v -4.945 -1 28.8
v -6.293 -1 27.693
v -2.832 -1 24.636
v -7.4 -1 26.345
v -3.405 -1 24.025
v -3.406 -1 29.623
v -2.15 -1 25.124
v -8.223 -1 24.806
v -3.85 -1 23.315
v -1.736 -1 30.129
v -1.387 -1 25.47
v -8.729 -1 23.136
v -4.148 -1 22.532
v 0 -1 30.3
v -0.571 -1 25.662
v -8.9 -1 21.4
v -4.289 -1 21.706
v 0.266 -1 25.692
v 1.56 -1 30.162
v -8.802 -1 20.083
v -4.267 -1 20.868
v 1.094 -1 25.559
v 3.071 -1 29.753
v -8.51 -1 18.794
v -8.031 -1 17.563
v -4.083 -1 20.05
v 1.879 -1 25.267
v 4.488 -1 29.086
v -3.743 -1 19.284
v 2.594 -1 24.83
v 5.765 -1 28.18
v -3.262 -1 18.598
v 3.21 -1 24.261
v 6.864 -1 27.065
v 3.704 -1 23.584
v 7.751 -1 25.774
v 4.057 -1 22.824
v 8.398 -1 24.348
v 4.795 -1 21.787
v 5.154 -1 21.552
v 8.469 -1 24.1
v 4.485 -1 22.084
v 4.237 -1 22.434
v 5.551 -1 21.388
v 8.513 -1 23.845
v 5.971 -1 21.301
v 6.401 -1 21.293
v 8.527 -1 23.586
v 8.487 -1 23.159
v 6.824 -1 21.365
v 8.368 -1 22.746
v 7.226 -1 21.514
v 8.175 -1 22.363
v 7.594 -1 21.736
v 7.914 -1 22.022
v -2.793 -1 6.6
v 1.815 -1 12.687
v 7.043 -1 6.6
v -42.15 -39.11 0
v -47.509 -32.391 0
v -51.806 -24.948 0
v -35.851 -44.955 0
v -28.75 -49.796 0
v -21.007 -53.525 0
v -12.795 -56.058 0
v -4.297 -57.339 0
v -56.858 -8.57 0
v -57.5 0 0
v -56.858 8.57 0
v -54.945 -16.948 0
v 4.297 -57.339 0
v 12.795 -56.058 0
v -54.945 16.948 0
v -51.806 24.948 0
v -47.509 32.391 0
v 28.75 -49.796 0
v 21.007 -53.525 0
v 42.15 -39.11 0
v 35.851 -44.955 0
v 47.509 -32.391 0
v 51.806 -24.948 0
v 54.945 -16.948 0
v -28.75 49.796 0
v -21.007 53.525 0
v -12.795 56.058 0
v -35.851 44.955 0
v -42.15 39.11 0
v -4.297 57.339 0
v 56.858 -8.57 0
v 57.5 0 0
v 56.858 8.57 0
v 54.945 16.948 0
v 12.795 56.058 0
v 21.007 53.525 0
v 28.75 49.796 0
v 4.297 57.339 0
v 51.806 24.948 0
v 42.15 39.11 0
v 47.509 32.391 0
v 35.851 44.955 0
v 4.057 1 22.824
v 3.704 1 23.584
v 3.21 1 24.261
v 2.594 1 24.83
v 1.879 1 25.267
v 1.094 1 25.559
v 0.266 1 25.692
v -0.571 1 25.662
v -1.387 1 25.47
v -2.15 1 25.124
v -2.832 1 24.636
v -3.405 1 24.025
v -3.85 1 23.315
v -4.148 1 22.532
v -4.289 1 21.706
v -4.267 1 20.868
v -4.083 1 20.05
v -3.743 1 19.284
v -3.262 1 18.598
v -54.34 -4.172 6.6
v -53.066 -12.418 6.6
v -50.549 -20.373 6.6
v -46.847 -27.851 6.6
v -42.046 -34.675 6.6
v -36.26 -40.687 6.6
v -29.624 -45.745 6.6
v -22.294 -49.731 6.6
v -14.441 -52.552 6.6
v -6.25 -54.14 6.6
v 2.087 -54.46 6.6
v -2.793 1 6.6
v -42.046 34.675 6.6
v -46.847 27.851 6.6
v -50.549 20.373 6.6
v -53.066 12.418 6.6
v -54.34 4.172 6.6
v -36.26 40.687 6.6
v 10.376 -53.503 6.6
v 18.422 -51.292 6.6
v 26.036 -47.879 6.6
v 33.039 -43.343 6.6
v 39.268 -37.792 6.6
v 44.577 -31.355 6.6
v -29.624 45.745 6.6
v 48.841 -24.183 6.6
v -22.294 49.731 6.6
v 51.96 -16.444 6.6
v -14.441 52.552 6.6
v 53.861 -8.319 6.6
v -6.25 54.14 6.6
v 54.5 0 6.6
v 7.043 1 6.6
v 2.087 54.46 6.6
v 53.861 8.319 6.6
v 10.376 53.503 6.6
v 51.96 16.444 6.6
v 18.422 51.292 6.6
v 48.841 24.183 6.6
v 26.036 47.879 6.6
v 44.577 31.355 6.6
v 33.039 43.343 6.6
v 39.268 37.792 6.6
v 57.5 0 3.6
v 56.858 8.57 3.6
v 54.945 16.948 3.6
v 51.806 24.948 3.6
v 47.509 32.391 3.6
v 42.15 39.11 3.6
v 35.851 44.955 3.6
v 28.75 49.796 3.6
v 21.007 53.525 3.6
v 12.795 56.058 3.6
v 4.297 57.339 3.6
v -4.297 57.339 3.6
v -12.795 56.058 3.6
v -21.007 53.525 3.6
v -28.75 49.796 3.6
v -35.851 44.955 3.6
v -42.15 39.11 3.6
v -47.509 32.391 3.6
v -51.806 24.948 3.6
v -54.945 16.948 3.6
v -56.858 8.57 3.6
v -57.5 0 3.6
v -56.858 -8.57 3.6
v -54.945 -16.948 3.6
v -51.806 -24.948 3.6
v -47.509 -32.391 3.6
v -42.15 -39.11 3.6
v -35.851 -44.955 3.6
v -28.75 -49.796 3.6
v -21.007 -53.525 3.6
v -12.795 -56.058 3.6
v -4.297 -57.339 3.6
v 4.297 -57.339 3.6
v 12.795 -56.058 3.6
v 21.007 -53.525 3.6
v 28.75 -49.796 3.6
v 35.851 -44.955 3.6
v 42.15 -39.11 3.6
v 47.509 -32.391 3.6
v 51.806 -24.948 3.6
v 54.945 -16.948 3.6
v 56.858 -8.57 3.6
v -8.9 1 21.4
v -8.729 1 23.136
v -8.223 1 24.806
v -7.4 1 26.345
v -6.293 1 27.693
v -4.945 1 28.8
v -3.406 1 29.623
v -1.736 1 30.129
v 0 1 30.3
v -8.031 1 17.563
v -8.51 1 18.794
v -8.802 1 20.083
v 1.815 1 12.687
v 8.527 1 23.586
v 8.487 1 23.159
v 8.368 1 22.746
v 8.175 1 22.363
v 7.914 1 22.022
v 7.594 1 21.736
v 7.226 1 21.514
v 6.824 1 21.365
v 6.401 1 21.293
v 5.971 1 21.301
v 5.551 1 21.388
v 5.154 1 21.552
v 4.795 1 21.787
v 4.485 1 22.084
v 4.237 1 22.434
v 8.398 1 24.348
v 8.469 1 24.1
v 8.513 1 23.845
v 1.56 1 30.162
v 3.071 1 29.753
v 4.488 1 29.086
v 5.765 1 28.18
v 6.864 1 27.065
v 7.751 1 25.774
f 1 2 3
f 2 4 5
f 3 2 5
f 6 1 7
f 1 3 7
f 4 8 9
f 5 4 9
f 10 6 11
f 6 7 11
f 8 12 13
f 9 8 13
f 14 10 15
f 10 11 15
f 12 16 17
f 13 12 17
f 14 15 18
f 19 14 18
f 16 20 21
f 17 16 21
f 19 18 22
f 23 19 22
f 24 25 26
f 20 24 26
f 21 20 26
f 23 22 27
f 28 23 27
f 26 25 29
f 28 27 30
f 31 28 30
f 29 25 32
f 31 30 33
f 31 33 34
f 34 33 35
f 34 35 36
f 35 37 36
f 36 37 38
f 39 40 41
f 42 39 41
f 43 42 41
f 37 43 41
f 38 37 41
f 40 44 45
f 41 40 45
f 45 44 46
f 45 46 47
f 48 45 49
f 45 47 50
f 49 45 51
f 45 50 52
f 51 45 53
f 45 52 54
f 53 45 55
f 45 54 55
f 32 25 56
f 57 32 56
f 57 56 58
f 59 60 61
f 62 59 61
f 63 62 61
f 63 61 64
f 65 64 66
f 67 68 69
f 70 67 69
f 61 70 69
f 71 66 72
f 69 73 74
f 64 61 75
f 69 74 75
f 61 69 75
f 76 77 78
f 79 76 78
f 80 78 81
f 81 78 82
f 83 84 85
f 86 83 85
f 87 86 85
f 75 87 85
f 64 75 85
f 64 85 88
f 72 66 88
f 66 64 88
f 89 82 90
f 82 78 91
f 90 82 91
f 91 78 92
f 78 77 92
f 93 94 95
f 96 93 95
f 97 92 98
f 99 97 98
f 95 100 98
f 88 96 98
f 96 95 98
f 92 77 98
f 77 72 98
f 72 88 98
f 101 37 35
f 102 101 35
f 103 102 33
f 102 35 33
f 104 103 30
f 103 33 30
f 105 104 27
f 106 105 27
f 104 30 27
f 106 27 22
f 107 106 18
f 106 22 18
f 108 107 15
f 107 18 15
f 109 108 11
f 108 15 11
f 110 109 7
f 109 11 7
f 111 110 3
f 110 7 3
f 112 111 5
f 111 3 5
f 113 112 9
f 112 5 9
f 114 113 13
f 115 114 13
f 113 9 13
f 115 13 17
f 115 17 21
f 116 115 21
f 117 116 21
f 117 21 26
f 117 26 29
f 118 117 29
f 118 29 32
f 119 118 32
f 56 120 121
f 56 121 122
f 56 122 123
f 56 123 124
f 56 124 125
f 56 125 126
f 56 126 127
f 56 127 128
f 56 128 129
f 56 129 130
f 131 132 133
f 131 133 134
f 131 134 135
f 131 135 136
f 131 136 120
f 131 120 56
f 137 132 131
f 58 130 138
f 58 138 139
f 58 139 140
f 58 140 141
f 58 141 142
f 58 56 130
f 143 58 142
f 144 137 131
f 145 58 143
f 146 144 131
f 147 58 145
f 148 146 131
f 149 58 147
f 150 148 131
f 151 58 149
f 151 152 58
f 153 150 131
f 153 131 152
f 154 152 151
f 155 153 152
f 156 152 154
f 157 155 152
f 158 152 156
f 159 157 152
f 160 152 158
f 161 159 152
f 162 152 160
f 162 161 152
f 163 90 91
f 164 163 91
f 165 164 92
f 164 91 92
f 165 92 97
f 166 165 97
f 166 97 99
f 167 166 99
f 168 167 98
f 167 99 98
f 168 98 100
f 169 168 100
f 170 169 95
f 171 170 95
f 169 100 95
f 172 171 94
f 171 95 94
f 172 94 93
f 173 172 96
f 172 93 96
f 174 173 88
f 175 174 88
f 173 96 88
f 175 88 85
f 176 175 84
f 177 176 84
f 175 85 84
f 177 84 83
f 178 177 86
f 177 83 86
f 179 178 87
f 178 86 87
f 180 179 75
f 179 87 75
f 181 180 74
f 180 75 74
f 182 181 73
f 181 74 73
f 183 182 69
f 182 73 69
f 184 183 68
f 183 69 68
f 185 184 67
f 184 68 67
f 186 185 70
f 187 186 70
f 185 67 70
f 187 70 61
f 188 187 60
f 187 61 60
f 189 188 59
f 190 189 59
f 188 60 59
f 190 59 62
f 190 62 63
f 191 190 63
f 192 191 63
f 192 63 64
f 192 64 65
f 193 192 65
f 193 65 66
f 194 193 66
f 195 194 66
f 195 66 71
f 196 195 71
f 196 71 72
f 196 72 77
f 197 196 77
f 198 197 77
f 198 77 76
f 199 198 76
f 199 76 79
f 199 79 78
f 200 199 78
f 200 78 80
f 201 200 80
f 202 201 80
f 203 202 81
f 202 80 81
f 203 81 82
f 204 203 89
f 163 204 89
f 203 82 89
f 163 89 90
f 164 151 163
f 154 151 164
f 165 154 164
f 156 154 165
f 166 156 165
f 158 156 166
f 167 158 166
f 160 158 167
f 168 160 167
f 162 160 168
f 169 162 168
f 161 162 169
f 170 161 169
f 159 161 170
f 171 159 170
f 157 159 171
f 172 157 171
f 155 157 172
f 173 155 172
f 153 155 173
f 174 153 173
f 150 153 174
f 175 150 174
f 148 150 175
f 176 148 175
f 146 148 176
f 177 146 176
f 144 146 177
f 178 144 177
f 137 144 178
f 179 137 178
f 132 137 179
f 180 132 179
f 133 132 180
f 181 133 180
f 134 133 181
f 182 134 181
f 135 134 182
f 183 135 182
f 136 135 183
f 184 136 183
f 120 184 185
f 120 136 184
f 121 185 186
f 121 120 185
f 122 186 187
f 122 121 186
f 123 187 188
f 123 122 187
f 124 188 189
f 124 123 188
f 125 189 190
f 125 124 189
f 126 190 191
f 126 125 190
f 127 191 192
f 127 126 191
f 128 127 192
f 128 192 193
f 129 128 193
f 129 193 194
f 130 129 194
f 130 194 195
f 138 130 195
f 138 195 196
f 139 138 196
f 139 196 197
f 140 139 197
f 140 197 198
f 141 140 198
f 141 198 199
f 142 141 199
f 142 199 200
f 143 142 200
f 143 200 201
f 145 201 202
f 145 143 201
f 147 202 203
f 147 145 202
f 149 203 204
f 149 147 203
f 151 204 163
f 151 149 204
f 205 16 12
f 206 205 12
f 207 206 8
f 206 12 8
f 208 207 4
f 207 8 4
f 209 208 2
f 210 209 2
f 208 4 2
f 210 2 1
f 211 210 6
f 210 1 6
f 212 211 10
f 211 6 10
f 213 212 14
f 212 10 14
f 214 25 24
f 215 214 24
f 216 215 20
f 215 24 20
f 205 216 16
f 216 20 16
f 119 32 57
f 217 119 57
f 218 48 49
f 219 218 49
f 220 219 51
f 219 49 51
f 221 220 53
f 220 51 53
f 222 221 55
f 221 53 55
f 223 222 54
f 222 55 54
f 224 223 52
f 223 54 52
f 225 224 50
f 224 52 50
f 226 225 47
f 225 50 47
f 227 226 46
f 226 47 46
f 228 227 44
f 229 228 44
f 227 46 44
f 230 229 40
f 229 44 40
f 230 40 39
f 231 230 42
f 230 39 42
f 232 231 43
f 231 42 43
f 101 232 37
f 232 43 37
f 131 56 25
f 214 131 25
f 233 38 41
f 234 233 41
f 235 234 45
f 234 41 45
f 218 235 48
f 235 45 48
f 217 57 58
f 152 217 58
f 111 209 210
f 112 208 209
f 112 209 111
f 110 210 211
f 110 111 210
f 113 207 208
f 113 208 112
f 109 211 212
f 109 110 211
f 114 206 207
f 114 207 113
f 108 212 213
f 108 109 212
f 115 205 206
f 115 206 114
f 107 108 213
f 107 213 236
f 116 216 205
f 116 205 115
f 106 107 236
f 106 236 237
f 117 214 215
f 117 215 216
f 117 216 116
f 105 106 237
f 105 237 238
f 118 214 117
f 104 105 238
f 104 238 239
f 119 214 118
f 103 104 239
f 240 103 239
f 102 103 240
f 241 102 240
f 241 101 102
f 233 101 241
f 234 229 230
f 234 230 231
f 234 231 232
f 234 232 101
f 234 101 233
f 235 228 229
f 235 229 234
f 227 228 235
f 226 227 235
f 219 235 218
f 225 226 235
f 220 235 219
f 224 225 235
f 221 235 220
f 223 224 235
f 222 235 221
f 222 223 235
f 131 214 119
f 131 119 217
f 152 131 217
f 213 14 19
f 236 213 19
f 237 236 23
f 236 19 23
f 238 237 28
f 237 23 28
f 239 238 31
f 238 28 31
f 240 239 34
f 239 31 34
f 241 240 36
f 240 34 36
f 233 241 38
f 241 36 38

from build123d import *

# Parameters (mm, degrees)
F0_R     = 57.5
F1_DEPTH = 6.6
F2_SIZE  = 3
F3_W     = 17.8
F3_H     = 2
F4_DEPTH = 23.7
F6_DEPTH = 2


with BuildPart() as f1:
    # F0 (on Top) → F1 (new body)
    with BuildSketch(Plane.XY):
        Circle(F0_R)
    extrude(amount=F1_DEPTH)

    # F2
    f2_edges = [f1.edges().sort_by_distance(p)[0] for p in [
        (-57.5, 0, 6.6),
    ]]
    chamfer(f2_edges, length=F2_SIZE)

    # F3 (on face) → F4 (join)
    with BuildSketch(Plane.XY.offset(6.6)):
        Rectangle(F3_W, F3_H)
    extrude(amount=F4_DEPTH)

    # F5 (on face) → F6 (cut, through all)
    with BuildSketch(Plane.XZ.offset(1)):
        with BuildLine():
            Line((8.9, 6.6), (8.9, 21.4))
            ThreePointArc((8.9, 21.4), (6.9052664574, 15.7850828009), (1.8152145724, 12.6870787875))
            Line((1.8152145724, 12.6870787875), (7.0434488575, 6.6))
            Line((7.0434488575, 6.6), (8.9, 6.6))
        make_face()
        with BuildLine():
            ThreePointArc((1.8152145724, 12.6870787875), (6.9052664574, 15.7850828009), (8.9, 21.4))
            ThreePointArc((8.9, 21.4), (8.7734765611, 22.8953625083), (8.3975035885, 24.3482085207))
            ThreePointArc((8.3975035885, 24.3482085207), (8.494665146, 23.9727539281), (8.5273622155, 23.5863119259))
            ThreePointArc((8.5273622155, 23.5863119259), (6.6138042116, 21.3190089943), (4.0572208384, 22.8244153427))
            ThreePointArc((4.0572208384, 22.8244153427), (4.238870699, 22.12247851), (4.3, 21.4))
            ThreePointArc((4.3, 21.4), (1.4939175147, 17.3678528723), (-3.2619583531, 18.5982812949))
            Line((-3.2619583531, 18.5982812949), (1.8152145724, 12.6870787875))
        make_face()
        with BuildLine():
            ThreePointArc((4.3, 21.4), (4.238870699, 22.12247851), (4.0572208384, 22.8244153427))
            ThreePointArc((4.0572208384, 22.8244153427), (-2.1501541462, 25.1238202356), (-3.2619583531, 18.5982812949))
            ThreePointArc((-3.2619583531, 18.5982812949), (1.4939175147, 17.3678528723), (4.3, 21.4))
        make_face()
        with BuildLine():
            ThreePointArc((8.3975035885, 24.3482085207), (8.7734765611, 22.8953625083), (8.9, 21.4))
            Line((8.9, 21.4), (8.9, 30.3))
            Line((8.9, 30.3), (0, 30.3))
            ThreePointArc((0, 30.3), (5.146403801, 28.6611657409), (8.3975035885, 24.3482085207))
        make_face()
        with BuildLine():
            ThreePointArc((-8.9, 21.4), (-6.2932503526, 27.6932503526), (0, 30.3))
            Line((0, 30.3), (-8.9, 30.3))
            Line((-8.9, 30.3), (-8.9, 21.4))
        make_face()
        with BuildLine():
            Line((-2.7928547934, 6.6), (-8.0305968219, 17.5633980289))
            ThreePointArc((-8.0305968219, 17.5633980289), (-8.6799283325, 19.4330622423), (-8.9, 21.4))
            Line((-8.9, 21.4), (-8.9, 6.6))
            Line((-8.9, 6.6), (-2.7928547934, 6.6))
        make_face()
    extrude(amount=-F6_DEPTH, mode=Mode.SUBTRACT)


solid = f1.part
